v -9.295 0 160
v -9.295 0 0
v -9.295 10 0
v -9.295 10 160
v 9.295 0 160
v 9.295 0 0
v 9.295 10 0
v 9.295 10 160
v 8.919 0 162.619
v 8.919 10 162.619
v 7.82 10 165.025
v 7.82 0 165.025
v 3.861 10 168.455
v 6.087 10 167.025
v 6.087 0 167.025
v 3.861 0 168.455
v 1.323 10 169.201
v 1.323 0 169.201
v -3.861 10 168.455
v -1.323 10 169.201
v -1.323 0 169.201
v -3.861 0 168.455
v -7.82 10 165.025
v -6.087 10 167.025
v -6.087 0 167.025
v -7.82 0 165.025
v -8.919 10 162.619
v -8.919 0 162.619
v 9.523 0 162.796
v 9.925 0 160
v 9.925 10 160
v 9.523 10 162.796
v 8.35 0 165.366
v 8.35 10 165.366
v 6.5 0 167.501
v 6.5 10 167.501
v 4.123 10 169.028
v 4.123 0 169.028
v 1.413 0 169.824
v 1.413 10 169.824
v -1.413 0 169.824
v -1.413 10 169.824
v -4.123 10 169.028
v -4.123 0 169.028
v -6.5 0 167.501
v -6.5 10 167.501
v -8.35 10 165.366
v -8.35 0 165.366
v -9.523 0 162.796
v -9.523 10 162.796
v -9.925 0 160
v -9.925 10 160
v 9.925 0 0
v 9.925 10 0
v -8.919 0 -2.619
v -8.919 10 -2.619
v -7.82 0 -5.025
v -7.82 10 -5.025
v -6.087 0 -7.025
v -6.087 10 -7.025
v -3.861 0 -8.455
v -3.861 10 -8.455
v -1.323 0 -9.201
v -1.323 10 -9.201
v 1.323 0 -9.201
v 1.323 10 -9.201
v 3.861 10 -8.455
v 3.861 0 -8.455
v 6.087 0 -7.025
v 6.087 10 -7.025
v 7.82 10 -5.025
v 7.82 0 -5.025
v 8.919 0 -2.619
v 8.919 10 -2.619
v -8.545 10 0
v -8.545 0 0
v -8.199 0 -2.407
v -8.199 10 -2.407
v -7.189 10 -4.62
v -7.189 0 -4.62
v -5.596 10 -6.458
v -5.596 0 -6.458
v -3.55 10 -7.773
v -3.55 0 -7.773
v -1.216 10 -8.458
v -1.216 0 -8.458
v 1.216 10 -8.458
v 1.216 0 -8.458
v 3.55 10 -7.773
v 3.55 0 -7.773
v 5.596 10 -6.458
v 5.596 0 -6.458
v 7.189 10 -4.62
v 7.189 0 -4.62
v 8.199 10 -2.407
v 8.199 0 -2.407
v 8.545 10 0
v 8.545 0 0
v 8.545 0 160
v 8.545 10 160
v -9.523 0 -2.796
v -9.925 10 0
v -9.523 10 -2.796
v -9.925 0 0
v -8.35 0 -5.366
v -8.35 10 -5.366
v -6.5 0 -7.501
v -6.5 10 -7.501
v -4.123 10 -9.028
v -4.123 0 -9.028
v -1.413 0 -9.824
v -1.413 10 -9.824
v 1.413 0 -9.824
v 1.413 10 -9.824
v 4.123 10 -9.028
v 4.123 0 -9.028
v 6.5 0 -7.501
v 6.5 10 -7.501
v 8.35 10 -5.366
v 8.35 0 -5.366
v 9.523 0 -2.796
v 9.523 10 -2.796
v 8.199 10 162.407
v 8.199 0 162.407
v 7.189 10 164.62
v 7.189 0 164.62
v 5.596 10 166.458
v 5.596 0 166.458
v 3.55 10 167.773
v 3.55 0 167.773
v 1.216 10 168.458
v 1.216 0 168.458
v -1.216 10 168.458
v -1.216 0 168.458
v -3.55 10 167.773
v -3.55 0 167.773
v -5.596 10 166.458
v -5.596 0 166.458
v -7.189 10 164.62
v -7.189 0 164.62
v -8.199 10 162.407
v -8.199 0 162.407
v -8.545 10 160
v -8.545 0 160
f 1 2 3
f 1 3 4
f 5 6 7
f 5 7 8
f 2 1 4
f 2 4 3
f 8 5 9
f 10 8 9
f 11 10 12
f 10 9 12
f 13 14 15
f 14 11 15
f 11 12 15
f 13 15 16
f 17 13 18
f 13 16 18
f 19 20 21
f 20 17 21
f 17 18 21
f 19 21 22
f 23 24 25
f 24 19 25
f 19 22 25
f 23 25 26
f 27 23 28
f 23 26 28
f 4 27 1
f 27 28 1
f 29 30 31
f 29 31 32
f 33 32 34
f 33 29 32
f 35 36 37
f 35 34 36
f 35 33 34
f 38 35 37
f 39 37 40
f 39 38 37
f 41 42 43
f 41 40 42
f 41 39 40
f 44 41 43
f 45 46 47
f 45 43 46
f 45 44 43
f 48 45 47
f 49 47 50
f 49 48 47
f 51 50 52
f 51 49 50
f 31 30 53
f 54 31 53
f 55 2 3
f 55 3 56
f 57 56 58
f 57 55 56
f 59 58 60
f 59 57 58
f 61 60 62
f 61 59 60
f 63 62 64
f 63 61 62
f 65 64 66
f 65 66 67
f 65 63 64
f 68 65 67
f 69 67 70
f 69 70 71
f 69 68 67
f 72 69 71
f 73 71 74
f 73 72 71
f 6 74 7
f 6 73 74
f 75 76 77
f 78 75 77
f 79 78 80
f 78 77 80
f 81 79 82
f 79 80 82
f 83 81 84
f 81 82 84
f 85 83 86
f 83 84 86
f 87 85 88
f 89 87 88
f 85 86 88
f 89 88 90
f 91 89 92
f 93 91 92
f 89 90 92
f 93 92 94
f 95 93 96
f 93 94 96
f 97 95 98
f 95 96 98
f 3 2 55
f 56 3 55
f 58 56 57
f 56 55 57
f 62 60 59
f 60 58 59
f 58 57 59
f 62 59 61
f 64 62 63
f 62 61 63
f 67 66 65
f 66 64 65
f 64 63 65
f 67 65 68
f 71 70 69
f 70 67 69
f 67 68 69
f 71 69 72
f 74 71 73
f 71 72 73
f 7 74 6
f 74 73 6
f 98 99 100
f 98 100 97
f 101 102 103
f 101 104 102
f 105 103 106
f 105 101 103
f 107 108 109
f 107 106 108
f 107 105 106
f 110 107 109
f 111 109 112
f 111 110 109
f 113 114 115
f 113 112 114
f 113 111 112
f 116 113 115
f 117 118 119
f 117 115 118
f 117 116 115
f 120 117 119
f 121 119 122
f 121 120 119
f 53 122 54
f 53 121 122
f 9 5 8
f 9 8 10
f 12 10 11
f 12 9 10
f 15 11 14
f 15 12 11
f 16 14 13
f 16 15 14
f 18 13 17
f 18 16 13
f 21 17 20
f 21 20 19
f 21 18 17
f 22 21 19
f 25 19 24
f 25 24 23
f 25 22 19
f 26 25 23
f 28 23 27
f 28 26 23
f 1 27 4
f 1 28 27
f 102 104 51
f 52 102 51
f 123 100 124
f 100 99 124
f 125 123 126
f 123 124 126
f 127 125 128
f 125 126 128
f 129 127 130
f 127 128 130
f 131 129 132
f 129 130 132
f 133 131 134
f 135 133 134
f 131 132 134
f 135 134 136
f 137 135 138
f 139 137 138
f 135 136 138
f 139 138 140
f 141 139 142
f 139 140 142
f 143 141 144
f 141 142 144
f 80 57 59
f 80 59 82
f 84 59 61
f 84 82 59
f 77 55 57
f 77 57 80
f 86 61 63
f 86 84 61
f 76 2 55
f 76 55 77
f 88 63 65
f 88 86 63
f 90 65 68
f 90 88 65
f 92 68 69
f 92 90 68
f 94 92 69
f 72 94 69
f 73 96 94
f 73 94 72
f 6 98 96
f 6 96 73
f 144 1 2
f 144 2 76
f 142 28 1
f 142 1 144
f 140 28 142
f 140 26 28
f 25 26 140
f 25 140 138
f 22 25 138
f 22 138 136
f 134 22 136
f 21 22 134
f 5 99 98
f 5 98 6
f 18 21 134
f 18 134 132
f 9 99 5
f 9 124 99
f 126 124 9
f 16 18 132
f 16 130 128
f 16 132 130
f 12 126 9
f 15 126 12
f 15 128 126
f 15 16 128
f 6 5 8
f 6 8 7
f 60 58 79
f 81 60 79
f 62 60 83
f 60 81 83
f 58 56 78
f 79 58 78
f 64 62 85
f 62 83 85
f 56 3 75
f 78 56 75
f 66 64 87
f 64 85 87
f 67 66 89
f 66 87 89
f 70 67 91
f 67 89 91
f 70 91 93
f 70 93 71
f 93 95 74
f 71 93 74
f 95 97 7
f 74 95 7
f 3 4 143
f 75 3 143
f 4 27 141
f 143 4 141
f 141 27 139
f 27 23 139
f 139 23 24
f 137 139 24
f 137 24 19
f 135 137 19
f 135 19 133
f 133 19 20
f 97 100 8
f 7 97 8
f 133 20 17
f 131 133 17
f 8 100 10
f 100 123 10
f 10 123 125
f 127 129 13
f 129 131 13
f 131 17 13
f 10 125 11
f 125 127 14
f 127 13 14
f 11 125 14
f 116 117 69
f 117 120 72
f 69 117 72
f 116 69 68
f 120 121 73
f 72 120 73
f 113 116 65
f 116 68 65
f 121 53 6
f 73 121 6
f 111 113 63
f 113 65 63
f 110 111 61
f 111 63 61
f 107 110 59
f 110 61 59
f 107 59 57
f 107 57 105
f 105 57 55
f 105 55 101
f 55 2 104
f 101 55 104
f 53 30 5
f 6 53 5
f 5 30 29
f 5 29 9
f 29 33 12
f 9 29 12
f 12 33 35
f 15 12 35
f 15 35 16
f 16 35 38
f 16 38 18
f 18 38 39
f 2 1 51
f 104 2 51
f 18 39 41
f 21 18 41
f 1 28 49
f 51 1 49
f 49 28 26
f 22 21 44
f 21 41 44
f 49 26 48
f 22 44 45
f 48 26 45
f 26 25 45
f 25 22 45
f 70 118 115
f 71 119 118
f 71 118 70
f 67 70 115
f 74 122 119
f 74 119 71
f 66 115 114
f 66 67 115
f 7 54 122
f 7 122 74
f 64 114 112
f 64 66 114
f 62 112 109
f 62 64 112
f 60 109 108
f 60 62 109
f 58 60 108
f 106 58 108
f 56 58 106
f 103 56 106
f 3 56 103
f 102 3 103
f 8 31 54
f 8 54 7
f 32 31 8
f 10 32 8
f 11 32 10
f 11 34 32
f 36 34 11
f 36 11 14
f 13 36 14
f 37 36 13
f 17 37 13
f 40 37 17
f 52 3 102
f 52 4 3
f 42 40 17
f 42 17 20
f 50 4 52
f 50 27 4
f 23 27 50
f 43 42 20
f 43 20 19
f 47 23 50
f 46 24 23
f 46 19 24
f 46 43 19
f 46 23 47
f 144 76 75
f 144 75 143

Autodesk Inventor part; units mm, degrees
ref_plane "YZ Plane" through (0, 0, 0) normal (1, 0, 0) x (0, 1, 0)
ref_plane "XZ Plane" through (0, 0, 0) normal (0, 1, 0) x (-1, 0, 0)
ref_plane "XY Plane" through (0, 0, 0) normal (0, 0, 1) x (1, 0, 0)
sketch "スケッチ1" plane through (0, 0, 0) normal (0, 1, 0) x (-1, 0, 0)
  arc A0 (-9.5493, 0) -> (9.5493, 0) centre (0, 0) ccw construction
  arc A1 (9.5493, 160) -> (-9.5493, 160) centre (0, 160) ccw construction
  line L0 (9.5493, 160) -> (9.5493, 0) construction
  line L1 (-9.5493, 160) -> (-9.5493, 0) construction
  line L2 (9.2953, 0) -> (9.2953, 160)
  arc A2 (9.2953, 160) -> (-9.2953, 160) centre (0, 160) ccw
  line L3 (-9.2953, 160) -> (-9.2953, 0)
  arc A3 (-9.2953, 0) -> (9.2953, 0) centre (0, 0) ccw
  line L4 (9.9253, 0) -> (9.9253, 160)
  arc A4 (9.9253, 160) -> (-9.9253, 160) centre (0, 160) ccw
  line L5 (-9.9253, 160) -> (-9.9253, 0)
  arc A5 (-9.9253, 0) -> (9.9253, 0) centre (0, 0) ccw
  dimension "d0" = 19.0986
  dimension "d1" = 19.0986
  dimension "d2" = 160
  dimension "d3" = 0.254
  dimension "d4" = 0.63
extrude "押し出し1" add sketch "スケッチ1" along normal blind 10
sketch "スケッチ2" plane through (0, 0, 0) normal (0, -1, 0) x (1, 0, 0)
  line L0 (9.2953, 0) -> (9.2953, 160) projected
  arc A0 (9.2953, 160) -> (-9.2953, 160) centre (0, 160) ccw projected
  line L1 (9.2953, 0) -> (9.2953, 160)
  line L2 (-9.2953, 160) -> (-9.2953, 0) projected
  line L3 (-9.2953, 160) -> (-9.2953, 0)
  arc A1 (-9.2953, 0) -> (9.2953, 0) centre (0, 0) ccw projected
  arc A2 (-9.2953, 0) -> (9.2953, 0) centre (0, 0) ccw
  arc A3 (9.2953, 160) -> (-9.2953, 160) centre (0, 160) ccw
  line L4 (8.5453, 160) -> (8.5453, 0)
  arc A4 (-8.5453, 0) -> (8.5453, 0) centre (0, 0) ccw
  line L5 (-8.5453, 0) -> (-8.5453, 160)
  arc A5 (8.5453, 160) -> (-8.5453, 160) centre (0, 160) ccw
  dimension "d7" = 0.75
extrude "押し出し2" add sketch "スケッチ2" against normal blind 10 separate body
equation "\"d1\" = d0"
properties part number "belt1" material "ゴム"
